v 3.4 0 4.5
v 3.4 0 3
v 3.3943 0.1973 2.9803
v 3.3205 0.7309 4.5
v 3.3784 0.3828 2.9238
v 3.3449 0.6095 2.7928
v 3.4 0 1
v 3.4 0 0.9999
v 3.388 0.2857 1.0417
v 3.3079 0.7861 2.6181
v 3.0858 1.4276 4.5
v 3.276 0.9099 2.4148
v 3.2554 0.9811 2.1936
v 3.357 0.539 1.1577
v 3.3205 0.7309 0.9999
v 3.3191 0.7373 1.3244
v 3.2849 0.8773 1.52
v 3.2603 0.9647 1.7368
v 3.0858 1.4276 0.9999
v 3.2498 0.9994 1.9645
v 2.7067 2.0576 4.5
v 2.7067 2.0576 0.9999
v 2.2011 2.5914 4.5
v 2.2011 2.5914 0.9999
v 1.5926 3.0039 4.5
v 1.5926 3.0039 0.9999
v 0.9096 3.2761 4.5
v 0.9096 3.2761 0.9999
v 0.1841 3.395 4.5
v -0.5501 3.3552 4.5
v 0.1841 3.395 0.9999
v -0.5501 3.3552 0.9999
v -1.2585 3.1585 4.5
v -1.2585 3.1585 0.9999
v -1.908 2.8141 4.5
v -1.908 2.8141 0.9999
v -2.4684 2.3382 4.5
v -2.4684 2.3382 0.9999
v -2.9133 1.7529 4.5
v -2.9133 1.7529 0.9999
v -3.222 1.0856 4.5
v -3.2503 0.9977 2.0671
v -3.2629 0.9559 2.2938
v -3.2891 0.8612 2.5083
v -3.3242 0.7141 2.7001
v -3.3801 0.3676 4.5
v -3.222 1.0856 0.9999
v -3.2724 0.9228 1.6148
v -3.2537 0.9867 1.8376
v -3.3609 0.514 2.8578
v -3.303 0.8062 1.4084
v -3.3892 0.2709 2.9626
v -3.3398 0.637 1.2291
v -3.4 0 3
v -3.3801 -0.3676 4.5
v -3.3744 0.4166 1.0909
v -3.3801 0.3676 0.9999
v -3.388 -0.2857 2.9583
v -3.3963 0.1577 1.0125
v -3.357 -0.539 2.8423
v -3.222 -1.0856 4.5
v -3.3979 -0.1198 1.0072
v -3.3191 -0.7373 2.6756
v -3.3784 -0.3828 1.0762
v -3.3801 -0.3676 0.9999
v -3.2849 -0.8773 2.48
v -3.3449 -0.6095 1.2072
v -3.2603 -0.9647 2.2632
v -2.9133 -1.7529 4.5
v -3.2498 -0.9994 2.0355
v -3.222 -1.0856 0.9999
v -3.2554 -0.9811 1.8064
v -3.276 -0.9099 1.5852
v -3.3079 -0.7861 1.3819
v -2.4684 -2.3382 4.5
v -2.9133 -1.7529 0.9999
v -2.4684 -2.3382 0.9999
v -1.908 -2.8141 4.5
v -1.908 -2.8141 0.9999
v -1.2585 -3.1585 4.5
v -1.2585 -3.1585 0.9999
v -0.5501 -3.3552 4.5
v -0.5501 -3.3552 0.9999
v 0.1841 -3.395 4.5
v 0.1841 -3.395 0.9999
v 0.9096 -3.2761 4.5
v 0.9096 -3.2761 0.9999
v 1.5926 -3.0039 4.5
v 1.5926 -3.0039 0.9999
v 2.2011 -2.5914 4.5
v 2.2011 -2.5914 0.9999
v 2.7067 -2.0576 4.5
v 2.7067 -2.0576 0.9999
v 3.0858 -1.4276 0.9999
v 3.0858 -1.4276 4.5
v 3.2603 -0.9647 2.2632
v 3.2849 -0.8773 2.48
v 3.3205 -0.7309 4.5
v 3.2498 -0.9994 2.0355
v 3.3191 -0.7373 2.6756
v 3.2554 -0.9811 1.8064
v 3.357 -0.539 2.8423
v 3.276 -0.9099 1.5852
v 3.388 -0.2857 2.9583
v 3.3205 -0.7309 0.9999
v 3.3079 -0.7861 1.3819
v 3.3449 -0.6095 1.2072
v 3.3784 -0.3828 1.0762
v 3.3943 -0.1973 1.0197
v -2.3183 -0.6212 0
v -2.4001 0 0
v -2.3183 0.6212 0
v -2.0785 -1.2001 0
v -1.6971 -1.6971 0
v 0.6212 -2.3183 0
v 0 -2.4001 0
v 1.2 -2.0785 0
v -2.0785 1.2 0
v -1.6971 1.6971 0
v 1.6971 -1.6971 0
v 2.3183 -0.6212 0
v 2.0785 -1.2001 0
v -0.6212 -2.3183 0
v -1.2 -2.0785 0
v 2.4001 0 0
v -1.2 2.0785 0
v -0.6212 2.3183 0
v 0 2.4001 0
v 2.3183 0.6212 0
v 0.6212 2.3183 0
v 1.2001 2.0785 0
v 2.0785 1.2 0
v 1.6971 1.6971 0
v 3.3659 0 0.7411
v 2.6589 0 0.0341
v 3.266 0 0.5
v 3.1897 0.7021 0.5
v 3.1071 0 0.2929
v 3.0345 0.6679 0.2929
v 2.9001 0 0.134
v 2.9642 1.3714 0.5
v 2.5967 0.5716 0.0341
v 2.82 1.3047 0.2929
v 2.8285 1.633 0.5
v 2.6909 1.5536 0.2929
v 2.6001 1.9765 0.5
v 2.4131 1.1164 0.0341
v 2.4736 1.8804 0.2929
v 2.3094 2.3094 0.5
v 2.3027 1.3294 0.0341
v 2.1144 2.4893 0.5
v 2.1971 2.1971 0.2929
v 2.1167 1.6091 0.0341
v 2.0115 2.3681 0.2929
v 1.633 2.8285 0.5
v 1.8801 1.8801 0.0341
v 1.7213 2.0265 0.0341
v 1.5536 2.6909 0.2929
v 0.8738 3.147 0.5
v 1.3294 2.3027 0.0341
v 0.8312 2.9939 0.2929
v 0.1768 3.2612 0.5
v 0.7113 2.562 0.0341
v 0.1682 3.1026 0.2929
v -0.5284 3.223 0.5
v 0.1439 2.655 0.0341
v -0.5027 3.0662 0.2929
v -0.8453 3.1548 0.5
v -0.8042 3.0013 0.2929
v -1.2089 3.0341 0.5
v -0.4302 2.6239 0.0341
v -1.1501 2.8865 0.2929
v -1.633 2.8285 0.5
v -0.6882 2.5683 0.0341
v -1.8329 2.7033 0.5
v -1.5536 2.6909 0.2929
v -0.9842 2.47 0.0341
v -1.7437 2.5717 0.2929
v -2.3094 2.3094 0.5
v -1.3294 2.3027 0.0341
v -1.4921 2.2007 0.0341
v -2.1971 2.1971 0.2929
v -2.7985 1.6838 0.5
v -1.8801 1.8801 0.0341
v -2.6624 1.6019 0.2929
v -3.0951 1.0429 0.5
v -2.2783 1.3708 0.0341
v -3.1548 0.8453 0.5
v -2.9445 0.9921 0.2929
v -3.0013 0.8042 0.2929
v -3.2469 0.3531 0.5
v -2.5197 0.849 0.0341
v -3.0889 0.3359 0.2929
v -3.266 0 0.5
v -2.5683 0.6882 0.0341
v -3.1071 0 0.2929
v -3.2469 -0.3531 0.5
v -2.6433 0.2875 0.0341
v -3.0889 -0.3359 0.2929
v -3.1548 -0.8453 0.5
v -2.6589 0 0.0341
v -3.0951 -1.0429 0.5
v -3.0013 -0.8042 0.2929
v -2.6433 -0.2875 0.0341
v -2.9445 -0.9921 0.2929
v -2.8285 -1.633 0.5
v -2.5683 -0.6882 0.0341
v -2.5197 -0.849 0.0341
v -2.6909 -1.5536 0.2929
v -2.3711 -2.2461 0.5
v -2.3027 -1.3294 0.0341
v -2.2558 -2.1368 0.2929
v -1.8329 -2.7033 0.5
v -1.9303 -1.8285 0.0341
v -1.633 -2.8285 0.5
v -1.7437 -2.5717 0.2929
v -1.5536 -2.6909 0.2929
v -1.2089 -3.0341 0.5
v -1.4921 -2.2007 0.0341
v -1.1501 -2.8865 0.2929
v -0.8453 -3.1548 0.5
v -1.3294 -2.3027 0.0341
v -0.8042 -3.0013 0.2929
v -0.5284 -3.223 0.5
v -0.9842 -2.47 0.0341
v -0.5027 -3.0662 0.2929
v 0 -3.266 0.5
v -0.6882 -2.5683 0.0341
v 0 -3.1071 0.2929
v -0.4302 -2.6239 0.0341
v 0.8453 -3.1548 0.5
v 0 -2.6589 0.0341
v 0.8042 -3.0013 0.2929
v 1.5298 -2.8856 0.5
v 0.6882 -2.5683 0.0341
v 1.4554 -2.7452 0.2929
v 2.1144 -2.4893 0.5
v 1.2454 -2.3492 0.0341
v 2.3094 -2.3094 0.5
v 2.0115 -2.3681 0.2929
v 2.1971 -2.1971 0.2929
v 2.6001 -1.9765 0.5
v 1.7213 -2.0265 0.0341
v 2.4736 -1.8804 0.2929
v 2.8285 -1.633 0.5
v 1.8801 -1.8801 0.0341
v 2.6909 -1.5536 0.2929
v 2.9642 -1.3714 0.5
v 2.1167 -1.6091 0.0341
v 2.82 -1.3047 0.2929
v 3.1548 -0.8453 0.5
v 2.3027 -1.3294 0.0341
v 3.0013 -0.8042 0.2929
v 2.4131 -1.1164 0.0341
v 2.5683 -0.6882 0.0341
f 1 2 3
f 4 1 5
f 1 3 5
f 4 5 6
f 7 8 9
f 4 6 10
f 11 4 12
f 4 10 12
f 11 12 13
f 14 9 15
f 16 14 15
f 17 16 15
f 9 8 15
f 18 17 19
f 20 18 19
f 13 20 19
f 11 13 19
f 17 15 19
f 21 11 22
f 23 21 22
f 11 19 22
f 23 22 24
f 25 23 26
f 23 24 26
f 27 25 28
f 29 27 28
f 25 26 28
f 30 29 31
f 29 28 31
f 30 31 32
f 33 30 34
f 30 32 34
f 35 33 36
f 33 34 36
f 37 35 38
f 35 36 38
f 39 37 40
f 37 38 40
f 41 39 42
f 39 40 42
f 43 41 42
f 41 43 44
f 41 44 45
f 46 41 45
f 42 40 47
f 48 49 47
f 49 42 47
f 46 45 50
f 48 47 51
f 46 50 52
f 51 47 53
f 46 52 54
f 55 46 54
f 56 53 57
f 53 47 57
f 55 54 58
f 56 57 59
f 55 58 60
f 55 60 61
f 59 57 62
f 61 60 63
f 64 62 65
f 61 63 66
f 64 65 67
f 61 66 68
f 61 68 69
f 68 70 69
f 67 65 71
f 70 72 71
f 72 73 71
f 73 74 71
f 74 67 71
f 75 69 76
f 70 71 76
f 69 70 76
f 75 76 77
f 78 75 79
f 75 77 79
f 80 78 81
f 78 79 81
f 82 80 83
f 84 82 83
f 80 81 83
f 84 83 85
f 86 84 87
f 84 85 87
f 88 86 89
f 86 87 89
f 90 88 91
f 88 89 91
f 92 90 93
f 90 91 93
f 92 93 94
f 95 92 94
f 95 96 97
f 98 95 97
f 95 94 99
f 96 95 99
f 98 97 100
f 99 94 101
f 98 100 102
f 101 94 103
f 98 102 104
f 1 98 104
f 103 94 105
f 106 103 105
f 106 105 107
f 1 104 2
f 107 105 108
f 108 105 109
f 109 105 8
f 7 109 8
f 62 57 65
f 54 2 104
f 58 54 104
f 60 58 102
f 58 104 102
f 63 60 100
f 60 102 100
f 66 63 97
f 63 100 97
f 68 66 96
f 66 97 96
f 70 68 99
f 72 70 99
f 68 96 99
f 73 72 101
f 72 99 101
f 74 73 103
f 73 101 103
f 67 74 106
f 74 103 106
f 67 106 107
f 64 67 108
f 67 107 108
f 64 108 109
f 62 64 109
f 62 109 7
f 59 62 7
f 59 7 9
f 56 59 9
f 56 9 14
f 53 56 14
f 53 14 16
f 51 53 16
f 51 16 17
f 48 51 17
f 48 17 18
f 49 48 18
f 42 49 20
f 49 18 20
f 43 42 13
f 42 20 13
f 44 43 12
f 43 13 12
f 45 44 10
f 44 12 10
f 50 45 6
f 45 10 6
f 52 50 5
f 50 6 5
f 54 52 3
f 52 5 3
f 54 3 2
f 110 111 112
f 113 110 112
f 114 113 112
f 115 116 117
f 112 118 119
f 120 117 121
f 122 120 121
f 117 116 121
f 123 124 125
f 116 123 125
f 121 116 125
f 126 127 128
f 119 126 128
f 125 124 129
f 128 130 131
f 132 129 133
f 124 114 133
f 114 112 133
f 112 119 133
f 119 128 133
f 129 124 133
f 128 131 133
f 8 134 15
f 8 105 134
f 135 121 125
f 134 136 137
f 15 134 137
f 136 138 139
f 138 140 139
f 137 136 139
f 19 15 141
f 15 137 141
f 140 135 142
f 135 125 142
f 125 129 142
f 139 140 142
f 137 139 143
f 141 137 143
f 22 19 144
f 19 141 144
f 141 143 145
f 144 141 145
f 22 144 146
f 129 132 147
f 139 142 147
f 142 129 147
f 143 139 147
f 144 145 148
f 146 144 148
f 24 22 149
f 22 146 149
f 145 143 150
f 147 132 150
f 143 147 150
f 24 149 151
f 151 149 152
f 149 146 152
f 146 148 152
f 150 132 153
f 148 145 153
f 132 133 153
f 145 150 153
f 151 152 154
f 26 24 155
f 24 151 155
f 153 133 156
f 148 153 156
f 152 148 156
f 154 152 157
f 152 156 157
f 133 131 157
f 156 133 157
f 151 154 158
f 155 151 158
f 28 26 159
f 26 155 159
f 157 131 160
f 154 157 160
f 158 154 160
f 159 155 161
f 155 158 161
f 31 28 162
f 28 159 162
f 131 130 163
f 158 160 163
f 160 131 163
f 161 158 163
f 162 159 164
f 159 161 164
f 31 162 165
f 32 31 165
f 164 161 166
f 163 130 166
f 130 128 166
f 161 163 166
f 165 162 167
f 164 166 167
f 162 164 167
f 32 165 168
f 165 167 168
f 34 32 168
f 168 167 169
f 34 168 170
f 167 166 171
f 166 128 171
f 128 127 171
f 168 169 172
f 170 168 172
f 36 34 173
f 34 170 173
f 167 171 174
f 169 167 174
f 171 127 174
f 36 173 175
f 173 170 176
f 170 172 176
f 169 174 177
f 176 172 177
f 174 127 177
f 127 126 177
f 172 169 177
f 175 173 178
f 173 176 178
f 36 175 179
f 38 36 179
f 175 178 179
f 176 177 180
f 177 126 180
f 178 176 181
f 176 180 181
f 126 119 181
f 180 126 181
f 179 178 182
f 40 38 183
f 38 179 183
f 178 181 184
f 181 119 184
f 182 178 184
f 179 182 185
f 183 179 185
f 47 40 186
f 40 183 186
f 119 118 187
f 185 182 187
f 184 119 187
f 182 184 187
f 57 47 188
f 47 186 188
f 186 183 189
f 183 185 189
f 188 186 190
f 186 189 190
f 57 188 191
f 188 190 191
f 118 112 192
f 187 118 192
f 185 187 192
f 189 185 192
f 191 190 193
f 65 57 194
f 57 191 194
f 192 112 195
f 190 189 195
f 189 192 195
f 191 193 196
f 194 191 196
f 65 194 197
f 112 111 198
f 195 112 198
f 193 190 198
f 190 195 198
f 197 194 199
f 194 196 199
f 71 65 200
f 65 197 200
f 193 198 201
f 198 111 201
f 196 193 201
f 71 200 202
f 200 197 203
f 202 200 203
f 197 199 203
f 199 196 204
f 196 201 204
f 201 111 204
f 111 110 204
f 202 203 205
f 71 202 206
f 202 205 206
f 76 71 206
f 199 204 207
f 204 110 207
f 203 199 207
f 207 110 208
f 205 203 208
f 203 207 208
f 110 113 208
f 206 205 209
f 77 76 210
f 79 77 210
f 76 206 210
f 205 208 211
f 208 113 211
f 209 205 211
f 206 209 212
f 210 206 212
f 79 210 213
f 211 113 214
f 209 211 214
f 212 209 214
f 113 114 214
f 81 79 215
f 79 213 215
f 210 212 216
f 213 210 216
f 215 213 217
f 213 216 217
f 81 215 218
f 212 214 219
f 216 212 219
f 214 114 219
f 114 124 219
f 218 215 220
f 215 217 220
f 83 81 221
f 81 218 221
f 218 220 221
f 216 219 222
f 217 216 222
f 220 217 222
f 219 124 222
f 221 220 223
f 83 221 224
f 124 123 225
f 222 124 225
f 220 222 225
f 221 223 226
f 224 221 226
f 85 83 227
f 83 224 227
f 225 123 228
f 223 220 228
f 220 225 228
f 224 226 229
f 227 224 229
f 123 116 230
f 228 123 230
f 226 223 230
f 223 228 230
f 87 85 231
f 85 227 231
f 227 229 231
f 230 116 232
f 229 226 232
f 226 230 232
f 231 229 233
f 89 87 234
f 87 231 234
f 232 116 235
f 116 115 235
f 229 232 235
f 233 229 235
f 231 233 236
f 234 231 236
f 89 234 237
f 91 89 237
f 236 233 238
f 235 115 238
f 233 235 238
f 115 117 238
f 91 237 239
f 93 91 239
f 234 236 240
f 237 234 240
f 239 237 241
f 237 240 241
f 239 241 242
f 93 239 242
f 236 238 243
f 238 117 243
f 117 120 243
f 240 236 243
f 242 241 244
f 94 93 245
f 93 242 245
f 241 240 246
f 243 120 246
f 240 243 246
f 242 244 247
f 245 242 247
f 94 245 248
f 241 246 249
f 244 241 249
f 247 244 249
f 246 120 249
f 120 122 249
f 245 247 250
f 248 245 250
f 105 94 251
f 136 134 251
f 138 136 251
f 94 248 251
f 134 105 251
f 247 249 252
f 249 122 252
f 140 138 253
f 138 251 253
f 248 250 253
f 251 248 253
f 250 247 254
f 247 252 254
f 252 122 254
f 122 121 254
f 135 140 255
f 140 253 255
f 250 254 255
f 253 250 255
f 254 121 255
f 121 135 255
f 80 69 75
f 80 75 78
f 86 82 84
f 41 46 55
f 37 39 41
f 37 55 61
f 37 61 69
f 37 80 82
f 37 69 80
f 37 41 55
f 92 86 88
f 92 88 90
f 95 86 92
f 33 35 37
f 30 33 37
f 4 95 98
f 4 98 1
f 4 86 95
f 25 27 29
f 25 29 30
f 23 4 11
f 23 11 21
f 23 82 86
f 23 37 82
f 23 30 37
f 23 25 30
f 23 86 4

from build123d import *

# Parameters (mm, degrees)
SKETCH1_R           = 3.4
BOSS_EXTRUDE1_DEPTH = 4.5
SKETCH2_R           = 1
CUT_EXTRUDE1_DEPTH  = 10
FILLET1_R           = 1


with BuildPart() as part:
    # Sketch1 → Boss-Extrude1 (new body)
    with BuildSketch(Plane.XY):
        Circle(SKETCH1_R)
    extrude(amount=BOSS_EXTRUDE1_DEPTH)

    # Sketch2 → Cut-Extrude1 (cut)
    with BuildSketch(Plane(origin=(4, 0, 0), x_dir=(0, 0, -1), z_dir=(1, 0, 0))):
        with Locations(Location((-2, 0, 0), (0, 0, 180))):
            Circle(SKETCH2_R)
    extrude(amount=-CUT_EXTRUDE1_DEPTH, mode=Mode.SUBTRACT)

    # Fillet1
    fillet1_edges = [part.edges().sort_by_distance(p)[0] for p in [
        (-3.4, 0, 0),
    ]]
    fillet(fillet1_edges, radius=FILLET1_R - 0.0001)  # a hair under: the kernel refuses the full size


solid = part.part
